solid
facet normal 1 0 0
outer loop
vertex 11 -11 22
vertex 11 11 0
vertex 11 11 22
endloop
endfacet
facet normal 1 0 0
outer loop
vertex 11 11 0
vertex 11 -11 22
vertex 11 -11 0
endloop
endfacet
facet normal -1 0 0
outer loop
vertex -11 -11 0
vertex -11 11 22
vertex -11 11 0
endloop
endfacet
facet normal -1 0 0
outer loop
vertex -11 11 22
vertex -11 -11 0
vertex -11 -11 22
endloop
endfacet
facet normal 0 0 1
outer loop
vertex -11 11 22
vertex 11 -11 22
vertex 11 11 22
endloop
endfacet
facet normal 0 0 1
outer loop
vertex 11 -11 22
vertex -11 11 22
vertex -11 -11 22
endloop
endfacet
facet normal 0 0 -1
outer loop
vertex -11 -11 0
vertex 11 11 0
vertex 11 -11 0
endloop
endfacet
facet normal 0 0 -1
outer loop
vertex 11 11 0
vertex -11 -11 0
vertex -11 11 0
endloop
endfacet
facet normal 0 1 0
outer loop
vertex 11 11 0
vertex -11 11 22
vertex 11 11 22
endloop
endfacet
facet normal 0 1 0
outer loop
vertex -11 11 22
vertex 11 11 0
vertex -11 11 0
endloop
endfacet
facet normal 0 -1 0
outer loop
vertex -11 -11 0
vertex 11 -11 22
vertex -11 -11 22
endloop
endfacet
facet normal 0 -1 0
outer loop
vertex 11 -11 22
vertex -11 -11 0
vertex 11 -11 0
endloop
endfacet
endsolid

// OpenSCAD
// file: lib/tubes.scad
module tube_ext(h,r1,r2,width) {
	difference(){
		cylinder(h,r1,r2);
        translate([0,0,-0.01]) cylinder(h+0.02,r1-width,r2-width);
	}
}

module tube_int(h,r1,r2,width) {
	difference(){
		cylinder(h,r1+width,r2+width);
        translate([0,0,-0.01]) cylinder(h+0.02,r1,r2);
	}
}
// file: lib/mylib.scad
/*
/*
module rounded_cube(dx,dy,dz,r){
    union(){
        translate ([r,0,0]) cube([dx-2*r,dy,dz]);
        translate ([0,r,0]) cube([dx,dy-2*r,dz]);
        translate ([r,r,0]) cylinder(dz,r,r);
        translate ([dx-r,r,0]) cylinder(dz,r,r);
        translate ([r,dy-r,0]) cylinder(dz,r,r);
        translate ([dx-r,dy-r,0]) cylinder(dz,r,r);
    }
}
*/

module torus(R,r) {
    rotate_extrude(convexity = 10)
    translate([R, 0, 0]) circle(r = r, $fn = 100);
}

module disk(R,r){
    rotate_extrude(convexity = 10)
    { 
        intersection(){
            union(){
                translate([R-r, 0, 0]) circle(r = r, $fn = 100);
                translate([(R-r)/2,0]) square([R-r,r*2],center=true);        
            }
            translate([0,-r,0]) square([R,2*r]);            
        }
    }
}

/*
module rounded_cylinder(h,r,rb,rt){
    rotate_extrude(convexity = 10) 
    //mirror() 
	rotate([0,0,90])
    intersection(){
        square([h,r]);
        union(){
            translate([h-rt,0,0]) square([rt,r-rt]);
            translate([h-rt,r-rt,0]) 
            intersection(){
                circle(rt);
                square(rt*2);
            }
            square([rb,r-rb]);
            translate([0,r-rb,0]) intersection(){
                translate([rb,0,0]) circle(rb);
                translate([-rb,0,0]) square(rb*2);
            }    
            translate([rb,0,0]) square([h-rt-rb,r]);
        }
    }
}*/
module rounded_cylinder(h,rb,rt,rrb,rrt,center=1){
    
	
	translate([0,0,-h/2*(1-center)+(h-abs(h))/2]) 
	rotate_extrude(convexity = 10) 
		difference(){
			hull(){
				square([0.1,abs(h)]);
				translate([rt-rrt,abs(h)-rrt]) circle(rrt);
				translate([rb-rrb,       rrb]) circle(rrb);
			}
			translate([-rrb-rrt,0]) square([rrb+rrt,abs(h)]);
			
		}

	
}

module rounded_cube(w,l,h,rv,rb,rt){
	hull(){
		translate([-w/2+rv,-l/2+rv,0]) rounded_cylinder(h,rv,rv,rb,rt);
		translate([-w/2+rv,+l/2-rv,0]) rounded_cylinder(h,rv,rv,rb,rt);
		translate([+w/2-rv,+l/2-rv,0]) rounded_cylinder(h,rv,rv,rb,rt);
		translate([+w/2-rv,-l/2+rv,0]) rounded_cylinder(h,rv,rv,rb,rt);
	}
	//cubeZ0(w,l-2*rv,h);
	//cubeZ0(w-2*rv,l,h);
    
   /* 
    minkowski(){
        cube([w-2*rv,l-2*rv,h-rb-rt],center=true) ;
        //rounded_cylinder(rb+rt,rv,rb,rt);
        rounded_cylinder(7,10,5,2);
    }
    */
    
}

module cubeY0(xSize,ySize,zSize){
	translate([0,ySize/2,0]) cube([abs(xSize),abs(ySize),abs(zSize)],center=true);
	
}
module cubeX0(xSize,ySize,zSize){
	translate([xSize/2,0,0]) cube([abs(xSize),abs(ySize),abs(zSize)],center=true);
	
}

module cubeZ0(xSize,ySize,zSize){
	translate([0,0,zSize/2]) cube([abs(xSize),abs(ySize),abs(zSize)],center=true);
	
}
module cubeXZ0(xSize,ySize,zSize){
    translate([xSize/2,0,zSize/2]) cube([abs(xSize),abs(ySize),abs(zSize)],center=true);
}
module cubeYZ0(xSize,ySize,zSize){
    translate([0,ySize/2,zSize/2]) cube([abs(xSize),abs(ySize),abs(zSize)],center=true);
}
module cubeXYZ0(xSize,ySize,zSize){
	translate([xSize/2,ySize/2,zSize/2]) cube([abs(xSize),abs(ySize),abs(zSize)],center=true);
}

module skiletZ0(xSize,ySize,zSize,step=0.8,w=0.1){
    for(y=[-ySize/2:step:ySize/2]){
		for(x=[-xSize/2:step:xSize/2]){
			translate([x,y,0]) cubeZ0(w,w,zSize);
		}
    }

}


module arced_cube(xSize,ySize,zCube){
	radius = xSize/2;
	cubeZ0(ySize,radius*2,zCube);
	
	translate([0,0,zCube]) intersection(){
		cubeZ0(ySize,radius*2,radius);
		rotate([0,90,0]) translate([0,0,-ySize/2]) cylinder(ySize,radius,radius);
	}
	
}


module honey_cylinder(h,r){
	$fn=6;
	cylinder(h,r,r);
}

module honey_cube(sx,sy,sz,d,w,inv=true){
	$fn=6;
	dy = w+d*sin(60);
	dx = 3/2*d+2*w*sin(60);

	{
		if (inv){
			intersection(){
				cubeZ0(sx,sy,sz);
			
				union(){
					for(y=[-round(sy/2/dy)*dy-dy:dy:sy/2+dy]){
						for(x=[-round(sx/2/dx)*dx-dx:dx:sx/2+dx]){
							translate([x,y,-1]) honey_cylinder(sz+2,d/2);
						}
					}
					for(y=[-round(sy/2/dy)*dy+d*sin(60)/2+w*sin(30)-dy:dy:sy/2+dy]){
						for(x=[-round(sx/2/dx)*dx+d/2+d/4+w*cos(30)-dx:dx:sx/2+dx]){
							translate([x,y,-1]) honey_cylinder(sz+2,d/2);
						}
					}
				}
			}
		}
		else {
			difference(){
				cubeZ0(sx,sy,sz);
			
					for(y=[-round(sy/2/dy)*dy-dy:dy:sy/2+dy]){
						for(x=[-round(sx/2/dx)*dx-dx:dx:sx/2+dx]){
							translate([x,y,-1]) honey_cylinder(sz+2,d/2);
						}
					}
					for(y=[-round(sy/2/dy)*dy+d*sin(60)/2+w*sin(30)-dy:dy:sy/2+dy]){
						for(x=[-round(sx/2/dx)*dx+d/2+d/4+w*cos(30)-dx:dx:sx/2+dx]){
							translate([x,y,-1]) honey_cylinder(sz+2,d/2);
						}
					}
			}
		}
	}
}

module prism(l, w, h){
       polyhedron(
               points=[[0,0,0], [l,0,0], [l,w,0], [0,w,0], [0,w,h], [l,w,h]],
               faces=[[0,1,2,3],[5,4,3,2],[0,4,5,1],[0,3,4],[5,2,1]]
               );
       
    /*   // preview unfolded (do not include in your function
       z = 0.08;
       separation = 2;
       border = .2;
       translate([0,w+separation,0])
           cube([l,w,z]);
       translate([0,w+separation+w+border,0])
           cube([l,h,z]);
       translate([0,w+separation+w+border+h+border,0])
           cube([l,sqrt(w*w+h*h),z]);
       translate([l+border,w+separation+w+border+h+border,0])
           polyhedron(
                   points=[[0,0,0],[h,0,0],[0,sqrt(w*w+h*h),0], [0,0,z],[h,0,z],[0,sqrt(w*w+h*h),z]],
                   faces=[[0,1,2], [3,5,4], [0,3,4,1], [1,4,5,2], [2,5,3,0]]
                   );
       translate([0-border,w+separation+w+border+h+border,0])
           polyhedron(
                   points=[[0,0,0],[0-h,0,0],[0,sqrt(w*w+h*h),0], [0,0,z],[0-h,0,z],[0,sqrt(w*w+h*h),z]],
                   faces=[[1,0,2],[5,3,4],[0,1,4,3],[1,2,5,4],[2,0,3,5]]
                   );
				   */
       }
       
module cylinder_xyz(x,y,z,r0,r1){
    h = sqrt(x*x+y*y+z*z);
    rotate([0,acos(z/h),atan2(y,x)]) cylinder(h,r0,r1);
}       
module cylinder_2xyz(x0,y0,z0,x1,y1,z1,r0,r1){
    dx=x1-x0;
    dy=y1-y0;
    dz=z1-z0;
    translate([x0,y0,z0]) cylinder_xyz(dx,dy,dz,r0,r1);

}
       $fn=100;
//cylinder_xyz( 20,20,20,1);
//cylinder_2xyz(10,10,10,1, 20,20,20,1,1);

//      b1 ------- b2 
//     /          /|
//    b0 -------- b3
//    |          |
//
//                |
//    |         | |
//    | a1------+-a2 
//    |/        |/
//    a0------- a3

module poly8(a0,a1,a2,a3,
             b0,b1,b2,b3)
{
    polyhedron(points=[a0,a1,a2,a3, b0,b1,b2,b3],
               faces = [[0,3,2,1],[4,4+1,4+2,4+3],[0,1,4+1,4],[1,2,4+2,4+1],[3,4+3,4+2,2],[0,4,4+3,3]]);
    
    
}

//poly8 ([0,0,0],[0,0,1],[1,0,1],[1,1,0],  [0,20,0],[0,20,1],[1,20,1],[1,19,0] );

/*
intersection(){
    cube(10);
    poly8 ([0,0,0],[0,3,0],[3,3,0],[3,0,0],        [0,0,3],[0,1,3],[1,1,3],[1,0,3]);
}
*/
//    poly8 ([0,0,0],[0,3,0],[3,3,0],[3,0,0],        [0,0,3],[0,1,3],[1,1,3],[1,0,3]);




module rounded_arc_int_(h,rb,wb,rbint,rbext,
                          rt,wt,rtint,rtext, ang)  
{
    difference(){
        rotate_extrude(angle=ang) 
        hull(){
            translate([rb+rbint,rbint]) circle(rbint);
            translate([rb+wb-rbext,rbext]) circle(rbext);
            
            translate([rt+rtint,h-rtint]) circle(rtint);
            translate([rt+wt-rtext,h-rtext]) circle(rtext);
        }   
    }

          
}
module rounded_arc_int(h,rb,wb,rbint,rbext,
                         rt,wt,rtint,rtext, ang, roundendface=false)  
 {
    
    if (roundendface){
        difference(){
            rounded_arc_int_(h,rb,wb,rbint,rbext, rt,wt,rtint,rtext, ang);  
            rotate ([0,0,ang]) 
                mirror([0,1,0]) 
                    poly8(  [rb,0,0],[rb,rbint,0],[rb+wb,rbext,0],[rb+wb,0,0],
                            [rt,0,h],[rt,rtint,h],[rt+wt,rtext,h],[rt+wt,0,h]);
            poly8(  [rb,0,0],[rb,rbint,0],[rb+wb,rbext,0],[rb+wb,0,0],
                    [rt,0,h],[rt,rtint,h],[rt+wt,rtext,h],[rt+wt,0,h]);
          
        
        }
    }
    else {
           rounded_arc_int_(h,rb,wb,rbint,rbext, rt,wt,rtint,rtext, ang);  
    }
    
    if (roundendface){
        hull(){
            translate([rb+rbint,rbint,rbint]) sphere (rbint);
            translate([rb-rbext+wb,rbext,rbext]) sphere (rbext);
            translate([rt+rtint,rtint,h-rtint]) sphere (rtint);
            translate([rt-rtext+wt,rtext,h-rtext]) sphere (rtext);
           // cylinder_2xyz(rb+roundb,roundb,roundb,rb-roundb+wb,roundb,roundb,roundb,roundb);
           // cylinder_2xyz(rb+roundb,roundb,roundb,rt+roundt,roundt,h-roundt,roundb,roundt);
           // cylinder_2xyz(0,0,0,10,10,10,roundb,roundb);
       }
        hull(){
            rotate([0,0,ang]) translate([rb+rbint,-rbint,rbint]) sphere (rbint);
            rotate([0,0,ang]) translate([rb-rbext+wb,-rbext,rbext]) sphere (rbext);
            rotate([0,0,ang]) translate([rt+rtint,-rtint,h-rtint]) sphere (rtint);
            rotate([0,0,ang]) translate([rt-rtext+wt,-rtext,h-rtext]) sphere (rtext);
           
           
           // cylinder_2xyz(rb+roundb,roundb,roundb,rb-roundb+wb,roundb,roundb,roundb,roundb);
           // cylinder_2xyz(rb+roundb,roundb,roundb,rt+roundt,roundt,h-roundt,roundb,roundt);
           // cylinder_2xyz(0,0,0,10,10,10,roundb,roundb);
       }

    }
}

module leg(x,y,z,rb,rt,rw){
	difference(){
		cube([x,y,z]);
		
		//translate() 
		hull(){
				translate([x,0,rb]) rotate([-90,0,0]) cylinder(y,rb,rb);
				translate([rt,0,z]) rotate([-90,0,0]) cylinder(y,rt,rt);
				translate([x,0,z]) cube([rb,y,rt]);
		}
		hull(){
			translate([x,0,rw]) sphere(rw);
			translate([rw,0,rw]) sphere(rw);
			translate([rw,0,z]) sphere(rw);
		}
		
	}
		
		
	
}
module nut(h,size){
	$fn=6;
	rotate([0,0,0]) cylinder(h,size/sin(60)/2,size/sin(60)/2);
}

module cylinder_connector(h,rbot,rtop,r){
	alpha=atan(h/(rbot-rtop));
	dz=r*cos(alpha);
	dy=r*sin(alpha);
	difference(){
		hull(){
			torus(rbot-r,r);
			translate([0,0,h-dz-0.1])  cylinder(0.1,rtop+(r-r*sin(alpha)),rtop+(r-r*sin(alpha)));
		}
		cubeZ0(rbot*2,rbot*2,-2*r);
	}
	difference(){
		translate([0,0,h-dz])  cylinder(dz,rtop+(r-r*sin(alpha)),rtop);
		translate([0,0,h])  torus(rtop+r,r);
	}
	
}

module sector(h,rbot,rtop,ang){
	rotate_extrude(angle=ang) polygon( points=[[0,0],[rbot,0],[rtop,h],[0,h]] );
	
	//cylinder(h,r0,r1);
}


module cylinder_cut(cylinder_height,horda, cut) {
    //(R-cut)^2+(horda/2)^2=R^2;
	$fn=1000;
	R=(horda*horda/4+cut*cut)/2/cut;
	intersection(){
		translate([0,0,-R+cut]) rotate([0,90,0]) cylinder(cylinder_height,R,R,center=true);
		cubeZ0(cylinder_height,horda,cut);
	}
	
}

module frame_ext(x,y,z,t,r,center=true){
	if (center)
		linear_extrude(height = z, twist = 0, slices = 60) {
			difference() {
				offset(r) square([x-2*r,y-2*r], center=true);
				rint = r-t;
				offset(rint) square([x-2*t-2*rint,y-2*t-2*rint], center=true);
		    }
		}
	else
		linear_extrude(height = z, twist = 0, slices = 60) {
			translate([x/2,y/2,0])
			difference() {
				offset(r) square([x-2*r,y-2*r], center=true);
				rint = r-t;
				offset(rint) square([x-2*t-2*rint,y-2*t-2*rint], center=true);
		    }
		}

}
module frame_int(x,y,z,t,r,center=true){
	if (center)
		frame_ext(x+2*t,y+2*t,z,t,t+r,true);
	else 
		translate([x/2,y/2,0]) frame_ext(x+2*t,y+2*t,z,t,t+r,true);
	
}
//leg (50,50,50,2,2,2);
	
//rounded_arc_int(10,20,10,1,2,                    20,10,3,4,90,false);
module rounded_tube(h,r_bot_int,r_bot_ext,r_top_int,r_top_ext,rr){

	rotate_extrude(convexity=10)
	hull(){
		//translate([0,5,0]) circle (2);
		//translate([10,h-rr,0]) circle (rr);
		translate([r_top_int+rr,h-rr,0]) circle (rr);
		translate([r_top_ext-rr,h-rr,0]) circle (rr);
		
		translate([r_bot_int+rr,rr,0]) circle (rr);
		translate([r_bot_ext-rr,rr,0]) circle (rr);
	}
}
module my_cylinder(h,rbot,rtop,center=false){
	if (h>0)
		cylinder(h,rbot,rtop,center);
	else 
		translate([0,0,h]) cylinder(-h,rbot,rtop,center);
}
// main file
include <lib/mylib.scad>
include <lib/tubes.scad>

//r=7;
module tablet(r0,r1){
    cube(20,center=true);
    hull(){
    rotate_extrude(convexity = 10)
        translate([r0, 0, 0])
           circle(r1, $fn = 100);
    
    translate([10,0,0]) rotate_extrude(convexity = 10)
        translate([r0, 0, 0])
           circle(r1, $fn = 100);
    }
    //cylinder(r1*2,r0,r0,center=true);
}

module tablet2(r,l,w,h){
    difference(){
        cubeZ0(l,w,h);
        translate([0,0,-1]) cylinder(2*h,r,r);
       // cubeZ0(l,0.1,h);
        translate([0,w/4,h/2]) rotate([0,90,0]) cylinder(20,1.8/2,1.9/2);
    }
    
}

h=4;
   

//tablet2(5.1,21,14,h);

module capsule(r){
    translate([0,0,3*r-2]) sphere(r);
    translate([0,0,r])  cylinder(2*r,r,r);
    translate([0,0,r])  sphere(r);
    
}


module cuber(r,size,h){
    difference(){
        cubeZ0(size,size,size);
        //translate([0,0,0.8]) capsule(r);
        //translate([0,0,r]) cubeZ0(size+1,14.5,h);
        //#translate([-size/2,size/4+2,3]) rotate([0,90,0]) cylinder(size,1.9/2,1.9/2);
    }
}
r=5.5;

cuber(5.5,22,4);
translate([0,0,r+0.3]) #tablet2(5.5,22,14,4-0.6);


if(0) difference(){
    translate([0,0,r]) cube(4*r,center=true);
    hull(){
        tablet(r+2,1.5);
        translate([20,0,0]) tablet(r+2,1.5);
    }
}

if (0) difference(){
    cube(10,center=true);
}
//rotate([90,0,0]) cylinder(20,2,2,center=true);
if (0) hull(){
    sphere(r);
    translate([0,0,r]) sphere(r);
}
